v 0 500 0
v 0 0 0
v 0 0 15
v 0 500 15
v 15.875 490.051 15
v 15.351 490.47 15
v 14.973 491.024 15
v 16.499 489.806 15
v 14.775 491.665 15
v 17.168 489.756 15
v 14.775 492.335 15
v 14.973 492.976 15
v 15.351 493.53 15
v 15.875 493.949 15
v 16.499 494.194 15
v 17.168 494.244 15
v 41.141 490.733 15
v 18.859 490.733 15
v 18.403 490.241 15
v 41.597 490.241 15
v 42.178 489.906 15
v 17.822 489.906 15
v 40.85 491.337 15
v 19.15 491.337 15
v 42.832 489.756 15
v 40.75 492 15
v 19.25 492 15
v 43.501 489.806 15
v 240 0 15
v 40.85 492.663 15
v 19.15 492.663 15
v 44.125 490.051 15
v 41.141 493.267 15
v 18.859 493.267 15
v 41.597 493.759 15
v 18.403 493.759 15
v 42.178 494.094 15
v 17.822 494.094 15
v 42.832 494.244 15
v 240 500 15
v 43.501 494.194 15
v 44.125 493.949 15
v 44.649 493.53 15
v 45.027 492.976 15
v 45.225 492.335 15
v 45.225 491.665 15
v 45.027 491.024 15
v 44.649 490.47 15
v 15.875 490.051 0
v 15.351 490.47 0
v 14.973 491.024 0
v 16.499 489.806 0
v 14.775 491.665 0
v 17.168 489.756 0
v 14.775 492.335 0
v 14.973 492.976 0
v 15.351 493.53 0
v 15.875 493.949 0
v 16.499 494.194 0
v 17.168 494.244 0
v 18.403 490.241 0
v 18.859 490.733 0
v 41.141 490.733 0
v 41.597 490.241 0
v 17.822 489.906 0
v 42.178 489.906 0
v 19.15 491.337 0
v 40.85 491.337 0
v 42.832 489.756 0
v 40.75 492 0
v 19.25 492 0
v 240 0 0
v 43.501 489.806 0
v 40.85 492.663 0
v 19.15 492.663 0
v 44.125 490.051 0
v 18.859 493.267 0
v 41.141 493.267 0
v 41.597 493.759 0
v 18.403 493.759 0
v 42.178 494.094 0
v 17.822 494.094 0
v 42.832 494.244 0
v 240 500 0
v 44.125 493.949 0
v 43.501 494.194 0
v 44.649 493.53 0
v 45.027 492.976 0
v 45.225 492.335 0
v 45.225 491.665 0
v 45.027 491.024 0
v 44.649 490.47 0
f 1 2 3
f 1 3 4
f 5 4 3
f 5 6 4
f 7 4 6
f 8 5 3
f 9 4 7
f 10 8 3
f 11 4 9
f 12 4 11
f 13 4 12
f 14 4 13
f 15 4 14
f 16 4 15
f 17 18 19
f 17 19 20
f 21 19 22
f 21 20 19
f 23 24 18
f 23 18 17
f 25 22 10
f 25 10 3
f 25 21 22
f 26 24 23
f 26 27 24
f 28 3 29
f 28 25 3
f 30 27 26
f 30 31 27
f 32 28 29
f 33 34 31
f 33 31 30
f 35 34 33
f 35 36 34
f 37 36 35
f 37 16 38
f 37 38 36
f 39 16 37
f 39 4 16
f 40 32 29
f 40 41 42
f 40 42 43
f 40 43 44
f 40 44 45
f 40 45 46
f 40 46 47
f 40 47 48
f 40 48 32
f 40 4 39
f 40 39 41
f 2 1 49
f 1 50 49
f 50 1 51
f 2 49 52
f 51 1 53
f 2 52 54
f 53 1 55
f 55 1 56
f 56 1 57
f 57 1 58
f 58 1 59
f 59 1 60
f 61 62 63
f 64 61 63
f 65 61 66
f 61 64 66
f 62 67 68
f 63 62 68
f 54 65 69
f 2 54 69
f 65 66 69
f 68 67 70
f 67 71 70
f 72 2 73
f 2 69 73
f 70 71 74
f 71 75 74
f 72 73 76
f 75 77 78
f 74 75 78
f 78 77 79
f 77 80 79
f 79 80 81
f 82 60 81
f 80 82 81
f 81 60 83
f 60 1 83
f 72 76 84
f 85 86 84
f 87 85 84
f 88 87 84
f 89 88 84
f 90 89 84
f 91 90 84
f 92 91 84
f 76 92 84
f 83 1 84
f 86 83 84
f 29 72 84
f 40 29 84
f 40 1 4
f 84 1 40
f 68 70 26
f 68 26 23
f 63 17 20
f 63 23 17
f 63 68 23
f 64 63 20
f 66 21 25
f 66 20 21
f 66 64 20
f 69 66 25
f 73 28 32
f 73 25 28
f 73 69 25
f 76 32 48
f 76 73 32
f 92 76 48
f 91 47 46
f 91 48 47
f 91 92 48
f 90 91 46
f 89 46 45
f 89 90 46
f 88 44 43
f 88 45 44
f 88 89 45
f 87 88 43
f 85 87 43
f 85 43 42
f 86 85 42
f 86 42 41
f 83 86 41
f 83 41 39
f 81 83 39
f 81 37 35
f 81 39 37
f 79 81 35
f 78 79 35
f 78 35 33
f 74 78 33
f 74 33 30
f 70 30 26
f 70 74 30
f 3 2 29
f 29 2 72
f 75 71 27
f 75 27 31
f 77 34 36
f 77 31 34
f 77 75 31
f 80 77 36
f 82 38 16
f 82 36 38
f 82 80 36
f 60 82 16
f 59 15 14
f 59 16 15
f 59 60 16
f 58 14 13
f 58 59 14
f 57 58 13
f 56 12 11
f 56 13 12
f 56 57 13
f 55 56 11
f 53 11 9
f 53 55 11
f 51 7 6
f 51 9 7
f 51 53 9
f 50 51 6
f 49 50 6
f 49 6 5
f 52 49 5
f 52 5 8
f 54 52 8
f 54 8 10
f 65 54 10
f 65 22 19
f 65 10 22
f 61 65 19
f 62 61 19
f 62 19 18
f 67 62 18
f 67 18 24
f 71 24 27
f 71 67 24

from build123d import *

# Parameters (mm, degrees)
ESQUISSE1_W                  = 240
ESQUISSE1_H                  = 500
BOSS_EXTRU_1_DEPTH           = 15
ENL_V_MAT_EXTRU_1_DEPTH      = 555.819790563
ENL_V_MAT_EXTRU_1_DEPTH_BACK = 555.819790563
ESQUISSE2_R                  = 2.25


with BuildPart() as part:
    # Esquisse1 → Boss.-Extru.1 (new body)
    with BuildSketch(Plane.XY):
        with Locations((120, 250)):
            Rectangle(ESQUISSE1_W, ESQUISSE1_H)
    extrude(amount=BOSS_EXTRU_1_DEPTH)

    # Esquisse2 → Enlèv. mat.-Extru.1 (cut, two sides: drawn at the far end of the back side and taken through both)
    with BuildSketch(Plane.XY.offset(15).offset(-ENL_V_MAT_EXTRU_1_DEPTH_BACK)):
        with Locations((17, 492)):
            Circle(ESQUISSE2_R)
        with Locations(Location((43, 492, 0), (0, 0, 180))):
            Circle(ESQUISSE2_R)
    extrude(amount=ENL_V_MAT_EXTRU_1_DEPTH + ENL_V_MAT_EXTRU_1_DEPTH_BACK, mode=Mode.SUBTRACT)


solid = part.part
